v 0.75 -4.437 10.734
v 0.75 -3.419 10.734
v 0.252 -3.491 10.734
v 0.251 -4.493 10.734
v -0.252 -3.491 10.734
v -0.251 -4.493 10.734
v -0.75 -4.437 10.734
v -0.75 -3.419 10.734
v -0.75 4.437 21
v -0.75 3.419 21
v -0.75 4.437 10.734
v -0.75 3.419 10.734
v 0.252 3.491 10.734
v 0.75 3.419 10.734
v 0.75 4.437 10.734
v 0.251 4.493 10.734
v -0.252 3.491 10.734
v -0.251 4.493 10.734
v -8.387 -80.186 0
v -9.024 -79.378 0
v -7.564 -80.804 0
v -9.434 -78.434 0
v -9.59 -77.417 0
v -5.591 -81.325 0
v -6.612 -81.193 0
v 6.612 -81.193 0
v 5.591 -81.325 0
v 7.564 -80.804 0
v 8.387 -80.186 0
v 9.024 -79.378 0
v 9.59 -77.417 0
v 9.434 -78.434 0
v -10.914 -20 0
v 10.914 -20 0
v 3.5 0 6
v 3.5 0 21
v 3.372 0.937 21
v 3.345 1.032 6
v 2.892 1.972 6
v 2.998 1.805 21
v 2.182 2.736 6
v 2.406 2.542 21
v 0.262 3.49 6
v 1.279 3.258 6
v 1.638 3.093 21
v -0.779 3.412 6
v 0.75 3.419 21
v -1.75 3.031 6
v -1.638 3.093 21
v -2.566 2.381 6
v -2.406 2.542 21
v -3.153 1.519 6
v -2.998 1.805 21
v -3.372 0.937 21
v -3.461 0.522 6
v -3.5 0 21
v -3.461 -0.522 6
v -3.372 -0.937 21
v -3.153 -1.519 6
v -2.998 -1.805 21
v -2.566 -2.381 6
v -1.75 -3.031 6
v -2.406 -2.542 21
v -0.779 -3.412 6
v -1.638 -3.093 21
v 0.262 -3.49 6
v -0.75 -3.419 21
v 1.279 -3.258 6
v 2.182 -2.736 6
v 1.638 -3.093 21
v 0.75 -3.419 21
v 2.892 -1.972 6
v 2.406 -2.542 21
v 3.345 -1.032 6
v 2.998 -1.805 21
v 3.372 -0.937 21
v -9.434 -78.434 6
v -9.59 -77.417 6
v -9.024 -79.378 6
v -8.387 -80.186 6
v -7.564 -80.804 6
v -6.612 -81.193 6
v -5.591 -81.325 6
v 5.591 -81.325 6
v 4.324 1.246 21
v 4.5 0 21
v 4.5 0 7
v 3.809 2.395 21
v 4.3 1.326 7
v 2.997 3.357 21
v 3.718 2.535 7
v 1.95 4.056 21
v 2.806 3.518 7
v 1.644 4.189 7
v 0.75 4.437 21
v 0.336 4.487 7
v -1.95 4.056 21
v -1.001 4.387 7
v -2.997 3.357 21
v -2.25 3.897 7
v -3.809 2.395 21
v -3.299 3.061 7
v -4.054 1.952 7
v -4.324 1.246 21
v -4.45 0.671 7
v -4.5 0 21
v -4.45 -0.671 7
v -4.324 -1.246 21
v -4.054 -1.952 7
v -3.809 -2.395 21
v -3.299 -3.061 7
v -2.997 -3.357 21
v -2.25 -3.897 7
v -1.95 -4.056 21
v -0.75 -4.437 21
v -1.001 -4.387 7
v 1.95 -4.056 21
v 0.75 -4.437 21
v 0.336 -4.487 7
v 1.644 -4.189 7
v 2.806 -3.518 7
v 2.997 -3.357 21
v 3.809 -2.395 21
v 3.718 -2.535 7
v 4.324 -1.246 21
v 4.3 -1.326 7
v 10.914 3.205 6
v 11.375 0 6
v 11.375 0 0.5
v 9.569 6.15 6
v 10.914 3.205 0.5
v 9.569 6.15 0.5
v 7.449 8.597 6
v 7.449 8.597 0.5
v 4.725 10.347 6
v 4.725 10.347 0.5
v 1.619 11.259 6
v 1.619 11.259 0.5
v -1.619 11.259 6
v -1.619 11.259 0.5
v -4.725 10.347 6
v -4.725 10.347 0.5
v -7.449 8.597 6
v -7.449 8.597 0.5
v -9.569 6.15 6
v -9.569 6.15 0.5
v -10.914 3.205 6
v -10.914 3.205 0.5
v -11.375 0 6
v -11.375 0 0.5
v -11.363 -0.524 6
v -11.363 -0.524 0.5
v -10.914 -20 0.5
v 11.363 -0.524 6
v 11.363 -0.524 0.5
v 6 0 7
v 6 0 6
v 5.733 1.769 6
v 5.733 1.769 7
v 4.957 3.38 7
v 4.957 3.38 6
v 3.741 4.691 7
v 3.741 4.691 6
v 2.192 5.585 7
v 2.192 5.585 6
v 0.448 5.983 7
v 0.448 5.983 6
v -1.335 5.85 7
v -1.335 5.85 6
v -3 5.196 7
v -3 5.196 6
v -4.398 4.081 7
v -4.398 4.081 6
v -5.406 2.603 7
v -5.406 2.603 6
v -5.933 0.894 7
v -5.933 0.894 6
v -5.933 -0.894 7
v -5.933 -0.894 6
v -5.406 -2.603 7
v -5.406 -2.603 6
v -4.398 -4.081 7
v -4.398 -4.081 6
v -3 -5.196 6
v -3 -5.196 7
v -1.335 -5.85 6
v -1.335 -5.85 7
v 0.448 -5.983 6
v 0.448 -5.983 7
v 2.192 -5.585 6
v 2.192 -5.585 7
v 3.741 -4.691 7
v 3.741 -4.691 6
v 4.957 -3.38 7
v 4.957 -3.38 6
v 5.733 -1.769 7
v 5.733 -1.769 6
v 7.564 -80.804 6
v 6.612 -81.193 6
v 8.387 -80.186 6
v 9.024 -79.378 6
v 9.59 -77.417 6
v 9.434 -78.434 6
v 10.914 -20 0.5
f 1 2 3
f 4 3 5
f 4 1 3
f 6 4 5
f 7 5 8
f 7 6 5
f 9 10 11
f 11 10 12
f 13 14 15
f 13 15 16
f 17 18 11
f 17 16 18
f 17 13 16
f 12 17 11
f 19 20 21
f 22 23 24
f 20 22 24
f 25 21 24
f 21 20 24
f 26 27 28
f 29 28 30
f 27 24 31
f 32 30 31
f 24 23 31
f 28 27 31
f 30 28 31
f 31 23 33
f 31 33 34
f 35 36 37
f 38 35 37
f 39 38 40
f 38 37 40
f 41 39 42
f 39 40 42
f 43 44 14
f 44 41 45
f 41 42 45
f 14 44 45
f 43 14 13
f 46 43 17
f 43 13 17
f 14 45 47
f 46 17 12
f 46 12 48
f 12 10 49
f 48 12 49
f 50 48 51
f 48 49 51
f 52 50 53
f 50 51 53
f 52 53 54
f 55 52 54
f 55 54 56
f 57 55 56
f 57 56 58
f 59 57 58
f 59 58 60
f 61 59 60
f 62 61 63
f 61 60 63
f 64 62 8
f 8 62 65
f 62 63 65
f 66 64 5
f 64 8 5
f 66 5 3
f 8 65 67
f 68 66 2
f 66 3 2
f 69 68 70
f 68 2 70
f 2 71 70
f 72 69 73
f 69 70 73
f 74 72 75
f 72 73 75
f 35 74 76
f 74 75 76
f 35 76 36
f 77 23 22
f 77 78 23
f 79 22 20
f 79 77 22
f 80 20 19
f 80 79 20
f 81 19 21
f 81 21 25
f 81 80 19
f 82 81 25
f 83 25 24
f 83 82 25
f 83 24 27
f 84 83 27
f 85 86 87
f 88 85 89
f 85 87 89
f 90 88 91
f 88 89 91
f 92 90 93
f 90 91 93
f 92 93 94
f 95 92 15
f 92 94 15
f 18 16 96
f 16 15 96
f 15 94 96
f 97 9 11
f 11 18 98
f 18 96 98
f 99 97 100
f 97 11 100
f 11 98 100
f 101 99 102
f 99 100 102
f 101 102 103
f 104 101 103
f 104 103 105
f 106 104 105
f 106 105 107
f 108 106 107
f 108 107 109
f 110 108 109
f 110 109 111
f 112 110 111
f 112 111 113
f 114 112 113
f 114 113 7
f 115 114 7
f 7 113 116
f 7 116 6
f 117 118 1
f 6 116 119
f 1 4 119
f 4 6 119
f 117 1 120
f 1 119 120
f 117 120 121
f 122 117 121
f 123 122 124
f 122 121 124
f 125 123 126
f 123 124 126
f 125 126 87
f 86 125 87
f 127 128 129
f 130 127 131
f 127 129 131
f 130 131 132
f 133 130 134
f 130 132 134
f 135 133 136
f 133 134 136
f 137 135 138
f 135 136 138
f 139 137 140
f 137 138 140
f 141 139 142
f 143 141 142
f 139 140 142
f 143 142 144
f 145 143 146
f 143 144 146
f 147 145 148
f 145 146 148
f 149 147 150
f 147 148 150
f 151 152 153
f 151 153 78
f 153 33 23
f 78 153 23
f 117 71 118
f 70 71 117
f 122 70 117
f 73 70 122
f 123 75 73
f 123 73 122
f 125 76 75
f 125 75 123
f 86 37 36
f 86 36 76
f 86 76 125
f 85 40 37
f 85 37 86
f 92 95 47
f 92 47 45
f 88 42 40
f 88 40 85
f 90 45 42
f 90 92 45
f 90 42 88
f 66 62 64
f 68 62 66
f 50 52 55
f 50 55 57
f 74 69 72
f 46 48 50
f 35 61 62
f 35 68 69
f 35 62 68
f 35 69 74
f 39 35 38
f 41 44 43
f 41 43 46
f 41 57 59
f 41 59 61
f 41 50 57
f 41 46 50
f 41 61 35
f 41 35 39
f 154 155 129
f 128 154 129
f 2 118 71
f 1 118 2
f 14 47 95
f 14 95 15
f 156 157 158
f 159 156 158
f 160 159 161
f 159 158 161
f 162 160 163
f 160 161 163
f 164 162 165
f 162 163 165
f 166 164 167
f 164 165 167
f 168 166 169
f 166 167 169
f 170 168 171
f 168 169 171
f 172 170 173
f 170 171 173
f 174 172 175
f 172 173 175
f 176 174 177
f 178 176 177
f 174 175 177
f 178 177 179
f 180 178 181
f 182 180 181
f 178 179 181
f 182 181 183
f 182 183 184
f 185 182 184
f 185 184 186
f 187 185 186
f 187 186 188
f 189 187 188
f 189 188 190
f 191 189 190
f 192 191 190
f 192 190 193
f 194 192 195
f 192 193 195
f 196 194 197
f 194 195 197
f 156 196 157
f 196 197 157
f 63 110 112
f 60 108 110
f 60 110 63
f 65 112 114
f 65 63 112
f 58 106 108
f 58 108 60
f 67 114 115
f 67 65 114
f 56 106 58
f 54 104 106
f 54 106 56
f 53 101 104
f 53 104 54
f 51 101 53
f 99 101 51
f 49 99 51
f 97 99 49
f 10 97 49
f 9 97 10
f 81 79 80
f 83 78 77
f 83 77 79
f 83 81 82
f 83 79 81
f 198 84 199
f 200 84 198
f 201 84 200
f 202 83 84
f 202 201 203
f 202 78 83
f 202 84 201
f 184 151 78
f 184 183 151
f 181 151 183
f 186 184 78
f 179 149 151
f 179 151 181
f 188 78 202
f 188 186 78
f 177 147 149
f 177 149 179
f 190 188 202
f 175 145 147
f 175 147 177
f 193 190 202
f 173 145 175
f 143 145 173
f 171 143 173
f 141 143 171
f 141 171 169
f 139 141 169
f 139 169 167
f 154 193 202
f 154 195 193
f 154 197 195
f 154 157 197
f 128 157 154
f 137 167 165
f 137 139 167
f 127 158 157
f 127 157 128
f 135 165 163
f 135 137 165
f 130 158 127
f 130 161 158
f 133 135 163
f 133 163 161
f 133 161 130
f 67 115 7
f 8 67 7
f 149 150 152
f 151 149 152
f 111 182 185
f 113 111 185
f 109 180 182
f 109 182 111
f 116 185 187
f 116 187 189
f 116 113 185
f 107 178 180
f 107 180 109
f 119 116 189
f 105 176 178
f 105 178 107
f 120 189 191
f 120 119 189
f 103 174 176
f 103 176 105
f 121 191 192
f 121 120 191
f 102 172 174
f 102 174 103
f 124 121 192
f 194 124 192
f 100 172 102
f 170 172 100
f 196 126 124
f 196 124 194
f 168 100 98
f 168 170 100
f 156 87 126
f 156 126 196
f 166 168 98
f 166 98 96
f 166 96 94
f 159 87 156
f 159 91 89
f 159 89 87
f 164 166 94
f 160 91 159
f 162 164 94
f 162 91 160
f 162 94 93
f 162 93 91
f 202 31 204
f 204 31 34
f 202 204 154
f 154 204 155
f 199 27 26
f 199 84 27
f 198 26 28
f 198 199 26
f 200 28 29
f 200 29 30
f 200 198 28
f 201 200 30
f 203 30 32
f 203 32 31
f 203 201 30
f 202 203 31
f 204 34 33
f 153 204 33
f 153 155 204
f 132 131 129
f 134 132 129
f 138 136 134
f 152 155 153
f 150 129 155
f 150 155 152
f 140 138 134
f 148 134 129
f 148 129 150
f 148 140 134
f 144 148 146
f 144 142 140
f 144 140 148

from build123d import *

# Parameters (mm, degrees)
EXTRUDE_1_DEPTH     = 6
FILLET_1_R          = 4
SKETCH_2_R          = 4.5
EXTRUDE_2_DEPTH     = 15
SKETCH_4_R          = 6
EXTRUDE_3_DEPTH     = 1
SKETCH_5_R          = 3.5
CUT_EXTRUDE_1_DEPTH = 15
SKETCH_6_W          = 1.5
SKETCH_6_H          = 10.26625424
CUT_EXTRUDE_2_DEPTH = 16.875
CUT_EXTRUDE_3_DEPTH = 0.5


with BuildPart() as part:
    # 草圖1 → 填料-伸長1 (new body)
    with BuildSketch(Plane.XY):
        with BuildLine():
            Line((-11.362913376, -0.524237167), (-9.5, -81.325))
            Line((-9.5, -81.325), (9.5, -81.325))
            Line((9.5, -81.325), (11.362913376, -0.524237167))
            Line((11.362913376, -0.524237167), (11.375, 0))
            ThreePointArc((11.375, 0), (0, 11.375), (-11.375, 0))
            Line((-11.375, 0), (-11.362913376, -0.524237167))
        make_face()
    extrude(amount=EXTRUDE_1_DEPTH)

    # 圓角1
    fillet_1_edges = [part.edges().sort_by_distance(p)[0] for p in [
        (9.5, -81.325, 3),
        (-9.5, -81.325, 3),
    ]]
    fillet(fillet_1_edges, radius=FILLET_1_R)

    # 草圖2 → 填料-伸長2 (add)
    with BuildSketch(Plane.XY.offset(6)):
        Circle(SKETCH_2_R)
    extrude(amount=EXTRUDE_2_DEPTH)

    # 草圖4 → 填料-伸長3 (add)
    with BuildSketch(Plane.XY.offset(6)):
        Circle(SKETCH_4_R)
    extrude(amount=EXTRUDE_3_DEPTH)

    # 草圖5 → 除料-伸長1 (cut)
    with BuildSketch(Plane.XY.offset(21)):
        Circle(SKETCH_5_R)
    extrude(amount=-CUT_EXTRUDE_1_DEPTH, mode=Mode.SUBTRACT)

    # 草圖6 → 除料-伸長2 (cut, through all)
    with BuildSketch(Plane(origin=(0, -4.5, 0), x_dir=(-1, 0, 0), z_dir=(0, -1, 0))):
        with Locations((0, -15.86687288)):
            Rectangle(SKETCH_6_W, SKETCH_6_H)
    extrude(amount=-CUT_EXTRUDE_2_DEPTH, mode=Mode.SUBTRACT)

    # 草圖7 → 除料-伸長3 (cut)
    with BuildSketch(Plane(origin=(0, 0, 0), x_dir=(-1, 0, 0), z_dir=(0, 0, -1))):
        with BuildLine():
            Line((-10.913887181, -20), (10.913887181, -20))
            Line((10.913887181, -20), (11.375, 0))
            ThreePointArc((11.375, 0), (0, 11.375), (-11.375, 0))
            Line((-11.375, 0), (-10.913887181, -20))
        make_face()
    extrude(amount=-CUT_EXTRUDE_3_DEPTH, mode=Mode.SUBTRACT)


solid = part.part
